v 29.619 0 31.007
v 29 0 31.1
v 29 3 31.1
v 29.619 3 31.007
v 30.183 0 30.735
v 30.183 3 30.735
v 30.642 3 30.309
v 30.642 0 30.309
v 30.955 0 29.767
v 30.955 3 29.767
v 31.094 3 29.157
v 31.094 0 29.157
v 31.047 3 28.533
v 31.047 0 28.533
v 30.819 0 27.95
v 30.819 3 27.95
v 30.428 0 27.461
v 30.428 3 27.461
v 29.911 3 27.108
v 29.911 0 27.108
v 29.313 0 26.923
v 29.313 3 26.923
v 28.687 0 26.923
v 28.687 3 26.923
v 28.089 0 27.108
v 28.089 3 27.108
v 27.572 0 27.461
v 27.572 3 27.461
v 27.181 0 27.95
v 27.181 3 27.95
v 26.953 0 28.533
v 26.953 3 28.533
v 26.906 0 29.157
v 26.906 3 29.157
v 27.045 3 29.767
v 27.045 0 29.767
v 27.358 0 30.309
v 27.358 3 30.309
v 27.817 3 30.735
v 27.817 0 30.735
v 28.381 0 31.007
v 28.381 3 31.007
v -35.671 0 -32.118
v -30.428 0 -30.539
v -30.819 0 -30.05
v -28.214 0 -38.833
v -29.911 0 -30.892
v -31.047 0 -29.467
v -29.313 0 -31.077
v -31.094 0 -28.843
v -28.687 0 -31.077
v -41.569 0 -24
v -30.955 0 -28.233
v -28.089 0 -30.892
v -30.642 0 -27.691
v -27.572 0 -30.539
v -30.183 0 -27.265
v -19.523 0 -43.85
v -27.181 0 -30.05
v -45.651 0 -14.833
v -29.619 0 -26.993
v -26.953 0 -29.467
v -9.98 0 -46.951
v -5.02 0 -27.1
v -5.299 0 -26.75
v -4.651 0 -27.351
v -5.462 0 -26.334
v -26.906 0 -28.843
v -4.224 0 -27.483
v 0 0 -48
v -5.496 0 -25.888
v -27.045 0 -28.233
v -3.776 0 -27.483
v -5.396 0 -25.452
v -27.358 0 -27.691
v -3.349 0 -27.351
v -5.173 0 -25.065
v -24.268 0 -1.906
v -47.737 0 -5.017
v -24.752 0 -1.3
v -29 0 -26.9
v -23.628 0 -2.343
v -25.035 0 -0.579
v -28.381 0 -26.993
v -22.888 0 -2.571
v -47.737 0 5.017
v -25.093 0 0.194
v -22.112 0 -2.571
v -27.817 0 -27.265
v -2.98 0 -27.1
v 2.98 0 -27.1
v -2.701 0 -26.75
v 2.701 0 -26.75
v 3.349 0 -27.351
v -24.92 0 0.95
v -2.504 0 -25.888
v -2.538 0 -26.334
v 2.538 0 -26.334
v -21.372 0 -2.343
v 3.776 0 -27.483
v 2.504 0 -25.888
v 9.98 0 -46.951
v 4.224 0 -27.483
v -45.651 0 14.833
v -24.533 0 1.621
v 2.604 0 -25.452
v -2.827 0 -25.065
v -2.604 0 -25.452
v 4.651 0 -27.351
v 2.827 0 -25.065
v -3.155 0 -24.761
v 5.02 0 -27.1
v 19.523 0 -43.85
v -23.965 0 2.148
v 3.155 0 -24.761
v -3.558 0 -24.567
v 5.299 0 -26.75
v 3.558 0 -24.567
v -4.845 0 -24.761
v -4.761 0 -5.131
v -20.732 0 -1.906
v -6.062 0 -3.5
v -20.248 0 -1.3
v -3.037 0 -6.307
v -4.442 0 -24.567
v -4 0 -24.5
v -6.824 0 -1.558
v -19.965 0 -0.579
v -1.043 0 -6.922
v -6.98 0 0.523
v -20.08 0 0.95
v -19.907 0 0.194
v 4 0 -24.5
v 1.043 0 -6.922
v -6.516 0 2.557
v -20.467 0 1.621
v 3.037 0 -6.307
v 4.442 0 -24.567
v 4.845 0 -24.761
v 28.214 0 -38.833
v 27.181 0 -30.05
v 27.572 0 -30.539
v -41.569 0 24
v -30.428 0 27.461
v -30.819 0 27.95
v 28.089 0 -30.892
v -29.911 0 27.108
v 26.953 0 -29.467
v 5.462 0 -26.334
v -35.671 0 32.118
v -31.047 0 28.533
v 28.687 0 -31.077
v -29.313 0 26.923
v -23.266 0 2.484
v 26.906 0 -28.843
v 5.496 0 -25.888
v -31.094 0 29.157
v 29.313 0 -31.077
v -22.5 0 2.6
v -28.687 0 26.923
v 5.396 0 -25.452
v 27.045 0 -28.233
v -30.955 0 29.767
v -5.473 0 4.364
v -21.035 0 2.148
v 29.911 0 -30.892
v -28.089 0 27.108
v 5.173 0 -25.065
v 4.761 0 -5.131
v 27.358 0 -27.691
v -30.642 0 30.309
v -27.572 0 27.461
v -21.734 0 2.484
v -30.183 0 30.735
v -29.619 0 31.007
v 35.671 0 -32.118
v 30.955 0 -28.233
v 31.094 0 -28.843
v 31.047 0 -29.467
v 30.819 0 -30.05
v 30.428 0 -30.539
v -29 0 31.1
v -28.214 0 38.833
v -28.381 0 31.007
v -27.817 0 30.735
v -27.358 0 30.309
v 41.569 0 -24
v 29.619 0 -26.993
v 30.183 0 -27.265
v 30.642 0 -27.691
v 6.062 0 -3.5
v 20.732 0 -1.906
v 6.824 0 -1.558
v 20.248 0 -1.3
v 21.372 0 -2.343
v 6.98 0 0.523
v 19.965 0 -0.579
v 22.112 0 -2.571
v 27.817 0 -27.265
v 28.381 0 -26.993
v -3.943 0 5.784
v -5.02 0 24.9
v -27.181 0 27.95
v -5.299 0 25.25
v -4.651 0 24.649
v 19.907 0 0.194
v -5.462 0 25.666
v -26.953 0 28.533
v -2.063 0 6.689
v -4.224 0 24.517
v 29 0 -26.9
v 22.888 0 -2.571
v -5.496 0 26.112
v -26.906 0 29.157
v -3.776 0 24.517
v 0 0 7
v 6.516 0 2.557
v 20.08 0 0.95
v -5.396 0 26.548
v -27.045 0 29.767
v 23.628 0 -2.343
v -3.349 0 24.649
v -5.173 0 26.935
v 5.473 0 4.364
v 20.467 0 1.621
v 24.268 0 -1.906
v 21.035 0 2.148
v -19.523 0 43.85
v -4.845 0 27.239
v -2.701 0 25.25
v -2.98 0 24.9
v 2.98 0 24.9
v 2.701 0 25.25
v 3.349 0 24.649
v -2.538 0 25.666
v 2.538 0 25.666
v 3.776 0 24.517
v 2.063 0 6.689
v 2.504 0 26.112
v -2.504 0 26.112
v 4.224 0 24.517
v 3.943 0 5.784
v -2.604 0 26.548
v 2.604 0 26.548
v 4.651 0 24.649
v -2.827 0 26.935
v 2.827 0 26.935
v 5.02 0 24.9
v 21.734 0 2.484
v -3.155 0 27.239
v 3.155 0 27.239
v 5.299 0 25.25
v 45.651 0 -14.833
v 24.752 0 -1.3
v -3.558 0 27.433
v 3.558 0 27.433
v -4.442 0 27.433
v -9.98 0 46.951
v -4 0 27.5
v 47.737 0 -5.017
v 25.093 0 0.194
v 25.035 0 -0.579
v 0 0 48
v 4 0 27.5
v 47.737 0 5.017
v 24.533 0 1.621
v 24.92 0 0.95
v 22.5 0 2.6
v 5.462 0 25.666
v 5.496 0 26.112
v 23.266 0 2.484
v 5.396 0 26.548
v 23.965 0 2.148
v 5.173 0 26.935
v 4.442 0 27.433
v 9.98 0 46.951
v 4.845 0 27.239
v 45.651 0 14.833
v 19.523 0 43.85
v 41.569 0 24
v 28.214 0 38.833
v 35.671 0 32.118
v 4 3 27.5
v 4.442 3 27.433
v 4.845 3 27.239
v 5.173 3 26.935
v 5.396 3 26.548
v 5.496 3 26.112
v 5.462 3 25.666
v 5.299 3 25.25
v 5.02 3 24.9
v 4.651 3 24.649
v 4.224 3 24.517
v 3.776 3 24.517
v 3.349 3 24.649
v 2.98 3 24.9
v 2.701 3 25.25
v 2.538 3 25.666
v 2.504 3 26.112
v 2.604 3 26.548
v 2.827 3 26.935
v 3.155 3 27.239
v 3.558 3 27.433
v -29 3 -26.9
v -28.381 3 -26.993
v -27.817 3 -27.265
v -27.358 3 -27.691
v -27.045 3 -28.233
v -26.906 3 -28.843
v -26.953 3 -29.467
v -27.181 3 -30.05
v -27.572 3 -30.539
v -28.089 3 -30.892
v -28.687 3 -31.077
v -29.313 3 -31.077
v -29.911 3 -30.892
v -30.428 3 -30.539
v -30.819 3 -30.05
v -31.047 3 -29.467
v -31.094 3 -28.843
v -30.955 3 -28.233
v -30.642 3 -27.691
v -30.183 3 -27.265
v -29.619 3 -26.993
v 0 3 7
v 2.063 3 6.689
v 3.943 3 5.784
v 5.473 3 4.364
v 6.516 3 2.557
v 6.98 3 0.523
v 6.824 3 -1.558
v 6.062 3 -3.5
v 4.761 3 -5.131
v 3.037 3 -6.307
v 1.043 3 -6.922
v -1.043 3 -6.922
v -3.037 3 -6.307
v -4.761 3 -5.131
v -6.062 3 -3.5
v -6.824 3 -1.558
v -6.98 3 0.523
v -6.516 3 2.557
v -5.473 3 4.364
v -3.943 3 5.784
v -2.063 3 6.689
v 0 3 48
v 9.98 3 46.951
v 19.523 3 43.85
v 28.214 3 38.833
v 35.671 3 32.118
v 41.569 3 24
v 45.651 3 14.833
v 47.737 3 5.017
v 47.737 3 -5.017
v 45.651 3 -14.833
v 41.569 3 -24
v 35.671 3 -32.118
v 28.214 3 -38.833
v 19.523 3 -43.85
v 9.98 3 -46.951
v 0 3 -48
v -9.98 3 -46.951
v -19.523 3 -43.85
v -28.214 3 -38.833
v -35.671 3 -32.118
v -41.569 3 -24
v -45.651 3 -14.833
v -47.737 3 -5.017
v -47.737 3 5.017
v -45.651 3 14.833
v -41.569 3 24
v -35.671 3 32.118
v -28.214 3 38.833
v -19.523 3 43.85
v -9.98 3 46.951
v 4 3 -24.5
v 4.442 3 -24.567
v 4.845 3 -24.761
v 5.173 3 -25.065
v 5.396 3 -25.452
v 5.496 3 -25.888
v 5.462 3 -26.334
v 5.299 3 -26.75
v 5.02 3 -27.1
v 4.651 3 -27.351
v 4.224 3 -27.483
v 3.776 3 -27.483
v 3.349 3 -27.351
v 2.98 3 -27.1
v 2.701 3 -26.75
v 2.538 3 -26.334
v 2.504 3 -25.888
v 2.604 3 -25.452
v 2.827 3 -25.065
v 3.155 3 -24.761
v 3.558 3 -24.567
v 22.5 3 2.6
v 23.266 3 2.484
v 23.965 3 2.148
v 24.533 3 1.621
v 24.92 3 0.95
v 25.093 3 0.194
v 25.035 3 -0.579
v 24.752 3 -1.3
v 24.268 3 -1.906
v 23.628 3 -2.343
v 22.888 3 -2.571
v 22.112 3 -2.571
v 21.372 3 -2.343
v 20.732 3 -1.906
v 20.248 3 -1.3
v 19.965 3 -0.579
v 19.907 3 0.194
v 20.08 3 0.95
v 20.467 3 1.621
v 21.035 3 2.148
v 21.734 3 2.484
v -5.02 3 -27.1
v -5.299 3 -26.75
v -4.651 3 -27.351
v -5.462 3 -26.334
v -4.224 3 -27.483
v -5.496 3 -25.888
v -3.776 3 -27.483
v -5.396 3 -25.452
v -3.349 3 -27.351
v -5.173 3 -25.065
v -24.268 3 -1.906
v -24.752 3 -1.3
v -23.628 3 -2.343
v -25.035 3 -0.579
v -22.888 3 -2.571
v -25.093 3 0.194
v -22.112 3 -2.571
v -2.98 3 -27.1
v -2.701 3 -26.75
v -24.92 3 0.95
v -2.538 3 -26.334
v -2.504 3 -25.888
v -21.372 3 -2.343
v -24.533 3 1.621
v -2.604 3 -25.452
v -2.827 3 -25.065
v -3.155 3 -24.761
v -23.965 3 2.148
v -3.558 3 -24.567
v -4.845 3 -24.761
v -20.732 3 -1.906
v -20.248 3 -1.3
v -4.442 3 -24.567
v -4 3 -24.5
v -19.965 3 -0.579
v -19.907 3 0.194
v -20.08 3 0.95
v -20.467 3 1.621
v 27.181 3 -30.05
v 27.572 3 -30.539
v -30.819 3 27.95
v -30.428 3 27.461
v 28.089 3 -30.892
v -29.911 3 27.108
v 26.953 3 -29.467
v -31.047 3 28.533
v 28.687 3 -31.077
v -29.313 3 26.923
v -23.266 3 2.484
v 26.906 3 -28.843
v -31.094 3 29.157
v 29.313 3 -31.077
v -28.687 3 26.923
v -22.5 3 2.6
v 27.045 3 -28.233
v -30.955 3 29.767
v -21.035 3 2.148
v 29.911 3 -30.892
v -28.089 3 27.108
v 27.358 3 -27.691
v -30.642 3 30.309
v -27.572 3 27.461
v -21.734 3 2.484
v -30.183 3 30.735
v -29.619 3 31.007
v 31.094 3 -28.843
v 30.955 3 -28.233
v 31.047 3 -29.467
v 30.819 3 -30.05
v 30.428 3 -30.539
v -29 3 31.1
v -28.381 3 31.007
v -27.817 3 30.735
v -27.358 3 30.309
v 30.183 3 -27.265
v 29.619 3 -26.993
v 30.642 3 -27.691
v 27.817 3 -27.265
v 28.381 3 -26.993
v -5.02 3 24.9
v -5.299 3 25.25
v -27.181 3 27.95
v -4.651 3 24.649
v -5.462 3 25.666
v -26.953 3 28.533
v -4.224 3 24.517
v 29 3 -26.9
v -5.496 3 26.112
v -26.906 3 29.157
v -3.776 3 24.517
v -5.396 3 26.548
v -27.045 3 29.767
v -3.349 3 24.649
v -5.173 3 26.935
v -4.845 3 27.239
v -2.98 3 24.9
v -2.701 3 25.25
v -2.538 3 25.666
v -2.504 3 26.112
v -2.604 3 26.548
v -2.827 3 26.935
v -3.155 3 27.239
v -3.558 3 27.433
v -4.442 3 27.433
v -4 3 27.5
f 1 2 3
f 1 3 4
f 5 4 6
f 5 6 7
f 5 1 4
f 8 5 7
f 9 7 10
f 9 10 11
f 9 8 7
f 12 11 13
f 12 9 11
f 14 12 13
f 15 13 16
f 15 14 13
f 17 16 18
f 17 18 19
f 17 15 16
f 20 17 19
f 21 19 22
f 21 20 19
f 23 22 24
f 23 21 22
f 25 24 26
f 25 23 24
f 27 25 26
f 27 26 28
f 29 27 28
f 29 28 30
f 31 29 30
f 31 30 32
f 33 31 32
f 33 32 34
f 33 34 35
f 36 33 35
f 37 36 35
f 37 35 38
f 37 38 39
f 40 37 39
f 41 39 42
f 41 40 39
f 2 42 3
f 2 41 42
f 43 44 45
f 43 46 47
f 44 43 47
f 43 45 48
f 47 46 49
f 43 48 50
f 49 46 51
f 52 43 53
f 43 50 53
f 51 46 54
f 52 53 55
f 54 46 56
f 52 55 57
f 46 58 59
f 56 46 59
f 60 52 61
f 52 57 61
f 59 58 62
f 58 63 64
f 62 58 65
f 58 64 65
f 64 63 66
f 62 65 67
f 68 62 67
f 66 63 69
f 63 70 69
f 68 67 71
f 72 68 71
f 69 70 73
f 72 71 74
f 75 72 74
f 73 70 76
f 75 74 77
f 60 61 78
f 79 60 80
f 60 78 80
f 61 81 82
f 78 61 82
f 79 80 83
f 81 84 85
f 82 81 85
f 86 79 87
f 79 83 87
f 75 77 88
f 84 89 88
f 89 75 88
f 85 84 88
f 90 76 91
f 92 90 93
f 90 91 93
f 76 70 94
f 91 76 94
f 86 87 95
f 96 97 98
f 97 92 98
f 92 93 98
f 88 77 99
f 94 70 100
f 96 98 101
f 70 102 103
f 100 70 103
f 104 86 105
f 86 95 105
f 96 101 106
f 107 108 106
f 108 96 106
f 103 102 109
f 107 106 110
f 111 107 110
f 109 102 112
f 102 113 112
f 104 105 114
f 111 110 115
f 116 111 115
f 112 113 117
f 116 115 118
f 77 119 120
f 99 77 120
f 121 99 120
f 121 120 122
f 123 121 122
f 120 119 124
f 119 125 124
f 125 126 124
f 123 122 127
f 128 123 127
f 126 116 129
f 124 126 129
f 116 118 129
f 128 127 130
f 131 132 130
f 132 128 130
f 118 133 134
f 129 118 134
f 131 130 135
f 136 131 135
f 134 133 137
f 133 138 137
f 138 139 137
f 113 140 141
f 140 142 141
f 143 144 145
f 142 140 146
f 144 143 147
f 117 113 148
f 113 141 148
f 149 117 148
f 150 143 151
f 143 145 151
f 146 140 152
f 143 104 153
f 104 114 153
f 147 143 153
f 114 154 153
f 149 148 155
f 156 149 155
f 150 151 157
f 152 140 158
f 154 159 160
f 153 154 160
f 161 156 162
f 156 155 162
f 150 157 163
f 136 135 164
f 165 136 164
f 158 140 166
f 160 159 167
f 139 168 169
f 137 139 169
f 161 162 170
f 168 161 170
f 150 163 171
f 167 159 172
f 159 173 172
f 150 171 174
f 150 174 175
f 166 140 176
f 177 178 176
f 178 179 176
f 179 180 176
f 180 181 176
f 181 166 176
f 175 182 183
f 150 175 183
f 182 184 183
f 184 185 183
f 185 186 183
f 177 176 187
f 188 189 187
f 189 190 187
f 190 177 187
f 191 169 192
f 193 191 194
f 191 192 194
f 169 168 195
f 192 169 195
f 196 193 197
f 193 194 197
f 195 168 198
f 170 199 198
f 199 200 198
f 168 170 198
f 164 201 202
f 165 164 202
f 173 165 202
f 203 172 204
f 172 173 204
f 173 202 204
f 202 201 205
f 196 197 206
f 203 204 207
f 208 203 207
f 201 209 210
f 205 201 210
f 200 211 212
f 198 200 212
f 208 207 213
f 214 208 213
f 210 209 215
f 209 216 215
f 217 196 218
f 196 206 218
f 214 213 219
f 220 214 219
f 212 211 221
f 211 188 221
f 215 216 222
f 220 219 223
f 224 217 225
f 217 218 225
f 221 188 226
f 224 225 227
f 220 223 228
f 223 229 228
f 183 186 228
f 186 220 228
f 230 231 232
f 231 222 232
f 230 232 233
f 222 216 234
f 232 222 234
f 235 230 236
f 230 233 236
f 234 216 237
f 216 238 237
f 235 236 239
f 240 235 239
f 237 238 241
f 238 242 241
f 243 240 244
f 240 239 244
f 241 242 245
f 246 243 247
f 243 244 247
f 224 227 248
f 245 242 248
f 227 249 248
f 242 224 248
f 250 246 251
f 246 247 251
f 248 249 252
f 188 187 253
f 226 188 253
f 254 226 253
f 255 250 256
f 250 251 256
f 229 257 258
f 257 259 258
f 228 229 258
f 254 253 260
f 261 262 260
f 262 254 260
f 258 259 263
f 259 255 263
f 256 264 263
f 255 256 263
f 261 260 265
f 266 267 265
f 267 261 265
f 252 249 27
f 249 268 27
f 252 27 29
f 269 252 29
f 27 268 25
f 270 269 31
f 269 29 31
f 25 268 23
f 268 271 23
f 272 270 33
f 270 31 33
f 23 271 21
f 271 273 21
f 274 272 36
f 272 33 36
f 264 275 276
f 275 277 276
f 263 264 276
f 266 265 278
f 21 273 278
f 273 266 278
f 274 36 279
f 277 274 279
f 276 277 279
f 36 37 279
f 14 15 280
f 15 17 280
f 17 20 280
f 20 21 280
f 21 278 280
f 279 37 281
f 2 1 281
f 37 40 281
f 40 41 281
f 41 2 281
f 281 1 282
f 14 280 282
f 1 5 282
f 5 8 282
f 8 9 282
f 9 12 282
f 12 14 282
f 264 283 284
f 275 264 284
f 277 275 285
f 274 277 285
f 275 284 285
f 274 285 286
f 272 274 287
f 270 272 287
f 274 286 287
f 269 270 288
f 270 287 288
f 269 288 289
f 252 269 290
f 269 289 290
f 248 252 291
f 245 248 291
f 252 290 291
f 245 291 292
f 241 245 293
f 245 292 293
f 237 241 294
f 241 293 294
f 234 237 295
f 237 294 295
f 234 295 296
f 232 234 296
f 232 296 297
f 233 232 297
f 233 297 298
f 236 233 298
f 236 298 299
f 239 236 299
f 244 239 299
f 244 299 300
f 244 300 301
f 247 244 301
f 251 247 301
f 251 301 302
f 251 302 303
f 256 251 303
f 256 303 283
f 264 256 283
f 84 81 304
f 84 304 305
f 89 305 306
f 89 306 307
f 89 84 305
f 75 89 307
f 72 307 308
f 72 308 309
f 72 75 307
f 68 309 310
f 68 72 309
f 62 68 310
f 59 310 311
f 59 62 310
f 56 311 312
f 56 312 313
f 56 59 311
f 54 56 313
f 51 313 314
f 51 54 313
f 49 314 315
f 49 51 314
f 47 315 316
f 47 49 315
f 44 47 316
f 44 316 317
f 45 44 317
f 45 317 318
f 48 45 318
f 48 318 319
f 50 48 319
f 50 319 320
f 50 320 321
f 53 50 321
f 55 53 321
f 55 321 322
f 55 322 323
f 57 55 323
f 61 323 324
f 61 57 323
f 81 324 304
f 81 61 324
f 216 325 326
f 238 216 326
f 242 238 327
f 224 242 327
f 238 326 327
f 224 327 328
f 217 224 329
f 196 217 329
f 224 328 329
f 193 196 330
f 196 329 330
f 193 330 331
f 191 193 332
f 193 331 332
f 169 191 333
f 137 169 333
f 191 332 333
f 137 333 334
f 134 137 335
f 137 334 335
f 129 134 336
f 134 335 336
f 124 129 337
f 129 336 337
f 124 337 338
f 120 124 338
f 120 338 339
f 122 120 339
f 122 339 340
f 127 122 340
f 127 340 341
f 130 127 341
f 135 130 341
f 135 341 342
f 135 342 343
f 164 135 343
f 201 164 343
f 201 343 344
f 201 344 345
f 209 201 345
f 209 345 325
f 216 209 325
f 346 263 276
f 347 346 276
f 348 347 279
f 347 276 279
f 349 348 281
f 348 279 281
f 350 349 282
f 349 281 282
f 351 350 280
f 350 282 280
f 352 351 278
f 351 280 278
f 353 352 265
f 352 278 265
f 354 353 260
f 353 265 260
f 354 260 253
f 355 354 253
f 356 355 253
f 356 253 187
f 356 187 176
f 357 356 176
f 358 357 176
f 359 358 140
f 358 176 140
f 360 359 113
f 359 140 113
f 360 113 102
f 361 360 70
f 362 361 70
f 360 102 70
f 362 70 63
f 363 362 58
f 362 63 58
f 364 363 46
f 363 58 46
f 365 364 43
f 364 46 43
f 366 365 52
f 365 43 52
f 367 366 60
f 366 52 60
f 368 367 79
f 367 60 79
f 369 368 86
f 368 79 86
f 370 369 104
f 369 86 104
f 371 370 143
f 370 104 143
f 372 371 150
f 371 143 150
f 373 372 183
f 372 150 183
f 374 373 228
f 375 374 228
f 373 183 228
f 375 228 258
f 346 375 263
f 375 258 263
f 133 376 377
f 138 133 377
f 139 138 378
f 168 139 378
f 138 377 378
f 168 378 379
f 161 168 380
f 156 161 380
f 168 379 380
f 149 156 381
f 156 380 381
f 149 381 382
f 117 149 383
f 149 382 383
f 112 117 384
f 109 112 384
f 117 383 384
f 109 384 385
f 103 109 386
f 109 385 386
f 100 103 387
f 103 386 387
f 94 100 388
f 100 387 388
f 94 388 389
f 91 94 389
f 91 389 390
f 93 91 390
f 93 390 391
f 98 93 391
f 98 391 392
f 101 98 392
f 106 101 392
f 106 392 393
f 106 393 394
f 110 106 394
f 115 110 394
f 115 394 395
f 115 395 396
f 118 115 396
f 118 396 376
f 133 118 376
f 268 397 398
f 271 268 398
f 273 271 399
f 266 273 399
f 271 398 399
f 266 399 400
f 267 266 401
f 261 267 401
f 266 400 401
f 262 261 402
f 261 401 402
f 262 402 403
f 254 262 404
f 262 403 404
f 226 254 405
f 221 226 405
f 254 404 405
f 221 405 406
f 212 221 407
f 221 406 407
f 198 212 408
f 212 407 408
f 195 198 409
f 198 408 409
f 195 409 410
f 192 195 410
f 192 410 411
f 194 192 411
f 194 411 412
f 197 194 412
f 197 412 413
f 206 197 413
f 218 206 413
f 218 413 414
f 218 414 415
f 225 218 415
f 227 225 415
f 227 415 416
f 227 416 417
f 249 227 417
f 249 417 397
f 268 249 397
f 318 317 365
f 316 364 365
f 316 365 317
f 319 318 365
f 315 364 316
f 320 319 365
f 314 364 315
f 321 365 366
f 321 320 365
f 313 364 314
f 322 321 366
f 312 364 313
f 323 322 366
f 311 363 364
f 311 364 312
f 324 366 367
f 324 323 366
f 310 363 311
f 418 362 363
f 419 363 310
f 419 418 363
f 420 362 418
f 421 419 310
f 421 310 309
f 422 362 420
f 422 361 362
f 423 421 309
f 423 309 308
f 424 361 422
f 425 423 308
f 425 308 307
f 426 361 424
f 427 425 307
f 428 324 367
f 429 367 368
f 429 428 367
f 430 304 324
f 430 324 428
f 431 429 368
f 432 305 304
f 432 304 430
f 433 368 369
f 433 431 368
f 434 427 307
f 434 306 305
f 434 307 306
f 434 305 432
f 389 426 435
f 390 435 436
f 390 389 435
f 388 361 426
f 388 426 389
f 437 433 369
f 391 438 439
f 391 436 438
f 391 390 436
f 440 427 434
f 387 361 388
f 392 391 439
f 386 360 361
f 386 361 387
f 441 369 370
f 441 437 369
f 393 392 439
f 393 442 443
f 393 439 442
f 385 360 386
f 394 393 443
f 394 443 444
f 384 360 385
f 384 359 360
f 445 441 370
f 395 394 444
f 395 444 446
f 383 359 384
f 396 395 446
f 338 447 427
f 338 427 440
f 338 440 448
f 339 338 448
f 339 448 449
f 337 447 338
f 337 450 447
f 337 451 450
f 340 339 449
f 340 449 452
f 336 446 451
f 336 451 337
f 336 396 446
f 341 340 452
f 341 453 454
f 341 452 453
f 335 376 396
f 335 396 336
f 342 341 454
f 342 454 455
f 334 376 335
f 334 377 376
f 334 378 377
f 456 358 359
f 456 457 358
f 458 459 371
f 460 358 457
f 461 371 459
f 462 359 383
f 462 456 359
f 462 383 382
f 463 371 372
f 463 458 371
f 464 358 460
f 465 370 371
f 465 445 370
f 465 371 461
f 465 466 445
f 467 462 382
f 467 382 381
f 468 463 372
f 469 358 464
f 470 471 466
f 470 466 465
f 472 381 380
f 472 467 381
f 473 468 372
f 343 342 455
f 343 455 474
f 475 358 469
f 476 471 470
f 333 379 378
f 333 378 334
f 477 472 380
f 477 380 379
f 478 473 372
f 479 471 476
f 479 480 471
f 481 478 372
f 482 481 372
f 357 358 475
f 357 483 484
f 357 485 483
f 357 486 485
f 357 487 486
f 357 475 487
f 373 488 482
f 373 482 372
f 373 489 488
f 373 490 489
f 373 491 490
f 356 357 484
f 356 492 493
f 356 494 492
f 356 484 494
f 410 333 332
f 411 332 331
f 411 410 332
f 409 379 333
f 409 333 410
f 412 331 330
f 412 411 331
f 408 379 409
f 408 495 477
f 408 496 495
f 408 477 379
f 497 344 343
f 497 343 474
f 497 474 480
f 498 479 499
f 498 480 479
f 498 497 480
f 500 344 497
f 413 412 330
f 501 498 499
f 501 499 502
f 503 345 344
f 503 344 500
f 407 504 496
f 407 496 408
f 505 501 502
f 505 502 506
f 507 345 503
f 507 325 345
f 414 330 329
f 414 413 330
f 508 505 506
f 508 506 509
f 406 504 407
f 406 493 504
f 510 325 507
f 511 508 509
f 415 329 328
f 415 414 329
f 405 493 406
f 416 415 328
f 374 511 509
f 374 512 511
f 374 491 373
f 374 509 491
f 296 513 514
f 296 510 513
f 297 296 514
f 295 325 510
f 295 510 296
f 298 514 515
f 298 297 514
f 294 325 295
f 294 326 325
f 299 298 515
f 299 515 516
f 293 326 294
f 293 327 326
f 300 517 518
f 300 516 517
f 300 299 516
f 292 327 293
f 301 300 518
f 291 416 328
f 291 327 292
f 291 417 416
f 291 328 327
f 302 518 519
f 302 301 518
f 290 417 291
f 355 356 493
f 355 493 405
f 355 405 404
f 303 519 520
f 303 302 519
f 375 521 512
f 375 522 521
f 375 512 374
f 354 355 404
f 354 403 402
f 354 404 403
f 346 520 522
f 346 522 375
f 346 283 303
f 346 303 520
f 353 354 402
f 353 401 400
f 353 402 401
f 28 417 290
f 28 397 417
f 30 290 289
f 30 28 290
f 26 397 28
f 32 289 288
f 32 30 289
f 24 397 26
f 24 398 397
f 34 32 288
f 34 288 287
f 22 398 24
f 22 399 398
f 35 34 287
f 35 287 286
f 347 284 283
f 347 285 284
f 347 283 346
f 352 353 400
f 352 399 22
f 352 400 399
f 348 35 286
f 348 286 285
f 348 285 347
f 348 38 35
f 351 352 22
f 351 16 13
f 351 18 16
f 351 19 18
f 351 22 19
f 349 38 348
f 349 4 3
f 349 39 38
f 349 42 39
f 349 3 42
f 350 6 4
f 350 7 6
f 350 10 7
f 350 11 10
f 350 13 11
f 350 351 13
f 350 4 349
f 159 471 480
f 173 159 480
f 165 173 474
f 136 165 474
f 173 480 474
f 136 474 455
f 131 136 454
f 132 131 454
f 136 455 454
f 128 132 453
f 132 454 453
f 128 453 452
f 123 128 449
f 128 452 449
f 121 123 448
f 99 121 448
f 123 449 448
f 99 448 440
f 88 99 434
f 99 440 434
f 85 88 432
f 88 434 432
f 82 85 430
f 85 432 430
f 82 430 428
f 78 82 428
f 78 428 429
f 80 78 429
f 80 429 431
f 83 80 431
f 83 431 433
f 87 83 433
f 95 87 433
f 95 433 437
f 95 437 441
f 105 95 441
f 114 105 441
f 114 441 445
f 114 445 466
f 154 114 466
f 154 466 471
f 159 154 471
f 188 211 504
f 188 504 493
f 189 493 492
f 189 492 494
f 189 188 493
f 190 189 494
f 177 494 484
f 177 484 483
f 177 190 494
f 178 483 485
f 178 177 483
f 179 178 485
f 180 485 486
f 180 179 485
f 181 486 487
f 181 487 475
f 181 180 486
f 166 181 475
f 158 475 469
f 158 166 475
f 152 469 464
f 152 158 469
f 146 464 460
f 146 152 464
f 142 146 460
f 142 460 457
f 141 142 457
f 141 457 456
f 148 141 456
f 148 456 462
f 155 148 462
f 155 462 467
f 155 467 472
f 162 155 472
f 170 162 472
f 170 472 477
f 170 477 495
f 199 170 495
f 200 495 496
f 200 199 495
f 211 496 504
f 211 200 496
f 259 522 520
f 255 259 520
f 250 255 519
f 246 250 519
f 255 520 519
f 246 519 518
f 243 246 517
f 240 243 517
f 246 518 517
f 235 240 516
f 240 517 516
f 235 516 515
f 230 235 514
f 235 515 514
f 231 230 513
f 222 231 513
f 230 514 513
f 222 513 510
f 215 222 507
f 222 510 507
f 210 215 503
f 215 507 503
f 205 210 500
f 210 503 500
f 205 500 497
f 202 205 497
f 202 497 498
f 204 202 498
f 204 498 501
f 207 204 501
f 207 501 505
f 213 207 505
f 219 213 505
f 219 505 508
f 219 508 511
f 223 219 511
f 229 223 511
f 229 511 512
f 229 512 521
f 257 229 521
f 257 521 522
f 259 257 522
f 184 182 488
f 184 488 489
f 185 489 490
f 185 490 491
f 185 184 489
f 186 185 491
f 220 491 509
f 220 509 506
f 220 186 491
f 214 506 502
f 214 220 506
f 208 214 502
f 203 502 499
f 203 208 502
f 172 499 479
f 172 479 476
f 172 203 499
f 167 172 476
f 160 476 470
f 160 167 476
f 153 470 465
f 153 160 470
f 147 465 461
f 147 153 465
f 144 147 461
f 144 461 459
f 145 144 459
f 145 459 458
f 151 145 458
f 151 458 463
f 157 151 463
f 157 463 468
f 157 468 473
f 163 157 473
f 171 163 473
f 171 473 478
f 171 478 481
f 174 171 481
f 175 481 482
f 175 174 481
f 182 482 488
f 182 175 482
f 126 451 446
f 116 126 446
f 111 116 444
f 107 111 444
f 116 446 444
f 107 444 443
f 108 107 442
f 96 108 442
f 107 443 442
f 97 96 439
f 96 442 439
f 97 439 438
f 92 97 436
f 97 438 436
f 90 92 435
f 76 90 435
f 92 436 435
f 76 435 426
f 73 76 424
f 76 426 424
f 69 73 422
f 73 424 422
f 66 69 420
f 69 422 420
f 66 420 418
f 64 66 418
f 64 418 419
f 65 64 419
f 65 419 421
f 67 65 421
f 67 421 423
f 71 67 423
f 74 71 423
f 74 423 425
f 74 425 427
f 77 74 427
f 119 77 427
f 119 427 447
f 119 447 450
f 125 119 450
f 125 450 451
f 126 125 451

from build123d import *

# Parameters (mm, degrees)
SKETCH_1_R          = 48
SKETCH_1_R_2        = 2.1
EXTRUDE_1_DEPTH     = 3
SKETCH_2_R          = 7
SKETCH_2_R_2        = 2.6
CUT_EXTRUDE_1_DEPTH = 68.948509917
SKETCH_3_R          = 1.5
CUT_EXTRUDE_2_DEPTH = 10


with BuildPart() as part:
    # 草图1 → 凸台-拉伸1 (new body)
    with BuildSketch(Plane(origin=(0, 0, 0), x_dir=(1, 0, 0), z_dir=(0, 1, 0))):
        with Locations(Location((0, 0, 0), (0, 0, 270))):
            Circle(SKETCH_1_R)
        with Locations(Location((-29, 29, 0), (0, 0, 270))):
            Circle(SKETCH_1_R_2, mode=Mode.SUBTRACT)
        with Locations(Location((29, 29, 0), (0, 0, 270))):
            Circle(SKETCH_1_R_2, mode=Mode.SUBTRACT)
        with Locations(Location((29, -29, 0), (0, 0, 270))):
            Circle(SKETCH_1_R_2, mode=Mode.SUBTRACT)
        with Locations(Location((-29, -29, 0), (0, 0, 270))):
            Circle(SKETCH_1_R_2, mode=Mode.SUBTRACT)
    extrude(amount=EXTRUDE_1_DEPTH)

    # 草图2 → 切除-拉伸1 (cut, through all)
    with BuildSketch(Plane(origin=(0, 3, 0), x_dir=(1, 0, 0), z_dir=(0, 1, 0))):
        with Locations(Location((0, 0, 0), (0, 0, 270))):
            Circle(SKETCH_2_R)
        with Locations(Location((-22.5, 0, 0), (0, 0, 270))):
            Circle(SKETCH_2_R_2)
        with Locations(Location((22.5, 0, 0), (0, 0, 270))):
            Circle(SKETCH_2_R_2)
    extrude(amount=-CUT_EXTRUDE_1_DEPTH, mode=Mode.SUBTRACT)

    # 草图3 → 切除-拉伸2 (cut)
    with BuildSketch(Plane(origin=(0, 3, 0), x_dir=(1, 0, 0), z_dir=(0, 1, 0))):
        with Locations(Location((4, 26, 0), (0, 0, 270))):
            Circle(SKETCH_3_R)
        with Locations(Location((-4, 26, 0), (0, 0, 270))):
            Circle(SKETCH_3_R)
        with Locations(Location((-4, -26, 0), (0, 0, 270))):
            Circle(SKETCH_3_R)
        with Locations(Location((4, -26, 0), (0, 0, 270))):
            Circle(SKETCH_3_R)
    extrude(amount=-CUT_EXTRUDE_2_DEPTH, mode=Mode.SUBTRACT)


solid = part.part
